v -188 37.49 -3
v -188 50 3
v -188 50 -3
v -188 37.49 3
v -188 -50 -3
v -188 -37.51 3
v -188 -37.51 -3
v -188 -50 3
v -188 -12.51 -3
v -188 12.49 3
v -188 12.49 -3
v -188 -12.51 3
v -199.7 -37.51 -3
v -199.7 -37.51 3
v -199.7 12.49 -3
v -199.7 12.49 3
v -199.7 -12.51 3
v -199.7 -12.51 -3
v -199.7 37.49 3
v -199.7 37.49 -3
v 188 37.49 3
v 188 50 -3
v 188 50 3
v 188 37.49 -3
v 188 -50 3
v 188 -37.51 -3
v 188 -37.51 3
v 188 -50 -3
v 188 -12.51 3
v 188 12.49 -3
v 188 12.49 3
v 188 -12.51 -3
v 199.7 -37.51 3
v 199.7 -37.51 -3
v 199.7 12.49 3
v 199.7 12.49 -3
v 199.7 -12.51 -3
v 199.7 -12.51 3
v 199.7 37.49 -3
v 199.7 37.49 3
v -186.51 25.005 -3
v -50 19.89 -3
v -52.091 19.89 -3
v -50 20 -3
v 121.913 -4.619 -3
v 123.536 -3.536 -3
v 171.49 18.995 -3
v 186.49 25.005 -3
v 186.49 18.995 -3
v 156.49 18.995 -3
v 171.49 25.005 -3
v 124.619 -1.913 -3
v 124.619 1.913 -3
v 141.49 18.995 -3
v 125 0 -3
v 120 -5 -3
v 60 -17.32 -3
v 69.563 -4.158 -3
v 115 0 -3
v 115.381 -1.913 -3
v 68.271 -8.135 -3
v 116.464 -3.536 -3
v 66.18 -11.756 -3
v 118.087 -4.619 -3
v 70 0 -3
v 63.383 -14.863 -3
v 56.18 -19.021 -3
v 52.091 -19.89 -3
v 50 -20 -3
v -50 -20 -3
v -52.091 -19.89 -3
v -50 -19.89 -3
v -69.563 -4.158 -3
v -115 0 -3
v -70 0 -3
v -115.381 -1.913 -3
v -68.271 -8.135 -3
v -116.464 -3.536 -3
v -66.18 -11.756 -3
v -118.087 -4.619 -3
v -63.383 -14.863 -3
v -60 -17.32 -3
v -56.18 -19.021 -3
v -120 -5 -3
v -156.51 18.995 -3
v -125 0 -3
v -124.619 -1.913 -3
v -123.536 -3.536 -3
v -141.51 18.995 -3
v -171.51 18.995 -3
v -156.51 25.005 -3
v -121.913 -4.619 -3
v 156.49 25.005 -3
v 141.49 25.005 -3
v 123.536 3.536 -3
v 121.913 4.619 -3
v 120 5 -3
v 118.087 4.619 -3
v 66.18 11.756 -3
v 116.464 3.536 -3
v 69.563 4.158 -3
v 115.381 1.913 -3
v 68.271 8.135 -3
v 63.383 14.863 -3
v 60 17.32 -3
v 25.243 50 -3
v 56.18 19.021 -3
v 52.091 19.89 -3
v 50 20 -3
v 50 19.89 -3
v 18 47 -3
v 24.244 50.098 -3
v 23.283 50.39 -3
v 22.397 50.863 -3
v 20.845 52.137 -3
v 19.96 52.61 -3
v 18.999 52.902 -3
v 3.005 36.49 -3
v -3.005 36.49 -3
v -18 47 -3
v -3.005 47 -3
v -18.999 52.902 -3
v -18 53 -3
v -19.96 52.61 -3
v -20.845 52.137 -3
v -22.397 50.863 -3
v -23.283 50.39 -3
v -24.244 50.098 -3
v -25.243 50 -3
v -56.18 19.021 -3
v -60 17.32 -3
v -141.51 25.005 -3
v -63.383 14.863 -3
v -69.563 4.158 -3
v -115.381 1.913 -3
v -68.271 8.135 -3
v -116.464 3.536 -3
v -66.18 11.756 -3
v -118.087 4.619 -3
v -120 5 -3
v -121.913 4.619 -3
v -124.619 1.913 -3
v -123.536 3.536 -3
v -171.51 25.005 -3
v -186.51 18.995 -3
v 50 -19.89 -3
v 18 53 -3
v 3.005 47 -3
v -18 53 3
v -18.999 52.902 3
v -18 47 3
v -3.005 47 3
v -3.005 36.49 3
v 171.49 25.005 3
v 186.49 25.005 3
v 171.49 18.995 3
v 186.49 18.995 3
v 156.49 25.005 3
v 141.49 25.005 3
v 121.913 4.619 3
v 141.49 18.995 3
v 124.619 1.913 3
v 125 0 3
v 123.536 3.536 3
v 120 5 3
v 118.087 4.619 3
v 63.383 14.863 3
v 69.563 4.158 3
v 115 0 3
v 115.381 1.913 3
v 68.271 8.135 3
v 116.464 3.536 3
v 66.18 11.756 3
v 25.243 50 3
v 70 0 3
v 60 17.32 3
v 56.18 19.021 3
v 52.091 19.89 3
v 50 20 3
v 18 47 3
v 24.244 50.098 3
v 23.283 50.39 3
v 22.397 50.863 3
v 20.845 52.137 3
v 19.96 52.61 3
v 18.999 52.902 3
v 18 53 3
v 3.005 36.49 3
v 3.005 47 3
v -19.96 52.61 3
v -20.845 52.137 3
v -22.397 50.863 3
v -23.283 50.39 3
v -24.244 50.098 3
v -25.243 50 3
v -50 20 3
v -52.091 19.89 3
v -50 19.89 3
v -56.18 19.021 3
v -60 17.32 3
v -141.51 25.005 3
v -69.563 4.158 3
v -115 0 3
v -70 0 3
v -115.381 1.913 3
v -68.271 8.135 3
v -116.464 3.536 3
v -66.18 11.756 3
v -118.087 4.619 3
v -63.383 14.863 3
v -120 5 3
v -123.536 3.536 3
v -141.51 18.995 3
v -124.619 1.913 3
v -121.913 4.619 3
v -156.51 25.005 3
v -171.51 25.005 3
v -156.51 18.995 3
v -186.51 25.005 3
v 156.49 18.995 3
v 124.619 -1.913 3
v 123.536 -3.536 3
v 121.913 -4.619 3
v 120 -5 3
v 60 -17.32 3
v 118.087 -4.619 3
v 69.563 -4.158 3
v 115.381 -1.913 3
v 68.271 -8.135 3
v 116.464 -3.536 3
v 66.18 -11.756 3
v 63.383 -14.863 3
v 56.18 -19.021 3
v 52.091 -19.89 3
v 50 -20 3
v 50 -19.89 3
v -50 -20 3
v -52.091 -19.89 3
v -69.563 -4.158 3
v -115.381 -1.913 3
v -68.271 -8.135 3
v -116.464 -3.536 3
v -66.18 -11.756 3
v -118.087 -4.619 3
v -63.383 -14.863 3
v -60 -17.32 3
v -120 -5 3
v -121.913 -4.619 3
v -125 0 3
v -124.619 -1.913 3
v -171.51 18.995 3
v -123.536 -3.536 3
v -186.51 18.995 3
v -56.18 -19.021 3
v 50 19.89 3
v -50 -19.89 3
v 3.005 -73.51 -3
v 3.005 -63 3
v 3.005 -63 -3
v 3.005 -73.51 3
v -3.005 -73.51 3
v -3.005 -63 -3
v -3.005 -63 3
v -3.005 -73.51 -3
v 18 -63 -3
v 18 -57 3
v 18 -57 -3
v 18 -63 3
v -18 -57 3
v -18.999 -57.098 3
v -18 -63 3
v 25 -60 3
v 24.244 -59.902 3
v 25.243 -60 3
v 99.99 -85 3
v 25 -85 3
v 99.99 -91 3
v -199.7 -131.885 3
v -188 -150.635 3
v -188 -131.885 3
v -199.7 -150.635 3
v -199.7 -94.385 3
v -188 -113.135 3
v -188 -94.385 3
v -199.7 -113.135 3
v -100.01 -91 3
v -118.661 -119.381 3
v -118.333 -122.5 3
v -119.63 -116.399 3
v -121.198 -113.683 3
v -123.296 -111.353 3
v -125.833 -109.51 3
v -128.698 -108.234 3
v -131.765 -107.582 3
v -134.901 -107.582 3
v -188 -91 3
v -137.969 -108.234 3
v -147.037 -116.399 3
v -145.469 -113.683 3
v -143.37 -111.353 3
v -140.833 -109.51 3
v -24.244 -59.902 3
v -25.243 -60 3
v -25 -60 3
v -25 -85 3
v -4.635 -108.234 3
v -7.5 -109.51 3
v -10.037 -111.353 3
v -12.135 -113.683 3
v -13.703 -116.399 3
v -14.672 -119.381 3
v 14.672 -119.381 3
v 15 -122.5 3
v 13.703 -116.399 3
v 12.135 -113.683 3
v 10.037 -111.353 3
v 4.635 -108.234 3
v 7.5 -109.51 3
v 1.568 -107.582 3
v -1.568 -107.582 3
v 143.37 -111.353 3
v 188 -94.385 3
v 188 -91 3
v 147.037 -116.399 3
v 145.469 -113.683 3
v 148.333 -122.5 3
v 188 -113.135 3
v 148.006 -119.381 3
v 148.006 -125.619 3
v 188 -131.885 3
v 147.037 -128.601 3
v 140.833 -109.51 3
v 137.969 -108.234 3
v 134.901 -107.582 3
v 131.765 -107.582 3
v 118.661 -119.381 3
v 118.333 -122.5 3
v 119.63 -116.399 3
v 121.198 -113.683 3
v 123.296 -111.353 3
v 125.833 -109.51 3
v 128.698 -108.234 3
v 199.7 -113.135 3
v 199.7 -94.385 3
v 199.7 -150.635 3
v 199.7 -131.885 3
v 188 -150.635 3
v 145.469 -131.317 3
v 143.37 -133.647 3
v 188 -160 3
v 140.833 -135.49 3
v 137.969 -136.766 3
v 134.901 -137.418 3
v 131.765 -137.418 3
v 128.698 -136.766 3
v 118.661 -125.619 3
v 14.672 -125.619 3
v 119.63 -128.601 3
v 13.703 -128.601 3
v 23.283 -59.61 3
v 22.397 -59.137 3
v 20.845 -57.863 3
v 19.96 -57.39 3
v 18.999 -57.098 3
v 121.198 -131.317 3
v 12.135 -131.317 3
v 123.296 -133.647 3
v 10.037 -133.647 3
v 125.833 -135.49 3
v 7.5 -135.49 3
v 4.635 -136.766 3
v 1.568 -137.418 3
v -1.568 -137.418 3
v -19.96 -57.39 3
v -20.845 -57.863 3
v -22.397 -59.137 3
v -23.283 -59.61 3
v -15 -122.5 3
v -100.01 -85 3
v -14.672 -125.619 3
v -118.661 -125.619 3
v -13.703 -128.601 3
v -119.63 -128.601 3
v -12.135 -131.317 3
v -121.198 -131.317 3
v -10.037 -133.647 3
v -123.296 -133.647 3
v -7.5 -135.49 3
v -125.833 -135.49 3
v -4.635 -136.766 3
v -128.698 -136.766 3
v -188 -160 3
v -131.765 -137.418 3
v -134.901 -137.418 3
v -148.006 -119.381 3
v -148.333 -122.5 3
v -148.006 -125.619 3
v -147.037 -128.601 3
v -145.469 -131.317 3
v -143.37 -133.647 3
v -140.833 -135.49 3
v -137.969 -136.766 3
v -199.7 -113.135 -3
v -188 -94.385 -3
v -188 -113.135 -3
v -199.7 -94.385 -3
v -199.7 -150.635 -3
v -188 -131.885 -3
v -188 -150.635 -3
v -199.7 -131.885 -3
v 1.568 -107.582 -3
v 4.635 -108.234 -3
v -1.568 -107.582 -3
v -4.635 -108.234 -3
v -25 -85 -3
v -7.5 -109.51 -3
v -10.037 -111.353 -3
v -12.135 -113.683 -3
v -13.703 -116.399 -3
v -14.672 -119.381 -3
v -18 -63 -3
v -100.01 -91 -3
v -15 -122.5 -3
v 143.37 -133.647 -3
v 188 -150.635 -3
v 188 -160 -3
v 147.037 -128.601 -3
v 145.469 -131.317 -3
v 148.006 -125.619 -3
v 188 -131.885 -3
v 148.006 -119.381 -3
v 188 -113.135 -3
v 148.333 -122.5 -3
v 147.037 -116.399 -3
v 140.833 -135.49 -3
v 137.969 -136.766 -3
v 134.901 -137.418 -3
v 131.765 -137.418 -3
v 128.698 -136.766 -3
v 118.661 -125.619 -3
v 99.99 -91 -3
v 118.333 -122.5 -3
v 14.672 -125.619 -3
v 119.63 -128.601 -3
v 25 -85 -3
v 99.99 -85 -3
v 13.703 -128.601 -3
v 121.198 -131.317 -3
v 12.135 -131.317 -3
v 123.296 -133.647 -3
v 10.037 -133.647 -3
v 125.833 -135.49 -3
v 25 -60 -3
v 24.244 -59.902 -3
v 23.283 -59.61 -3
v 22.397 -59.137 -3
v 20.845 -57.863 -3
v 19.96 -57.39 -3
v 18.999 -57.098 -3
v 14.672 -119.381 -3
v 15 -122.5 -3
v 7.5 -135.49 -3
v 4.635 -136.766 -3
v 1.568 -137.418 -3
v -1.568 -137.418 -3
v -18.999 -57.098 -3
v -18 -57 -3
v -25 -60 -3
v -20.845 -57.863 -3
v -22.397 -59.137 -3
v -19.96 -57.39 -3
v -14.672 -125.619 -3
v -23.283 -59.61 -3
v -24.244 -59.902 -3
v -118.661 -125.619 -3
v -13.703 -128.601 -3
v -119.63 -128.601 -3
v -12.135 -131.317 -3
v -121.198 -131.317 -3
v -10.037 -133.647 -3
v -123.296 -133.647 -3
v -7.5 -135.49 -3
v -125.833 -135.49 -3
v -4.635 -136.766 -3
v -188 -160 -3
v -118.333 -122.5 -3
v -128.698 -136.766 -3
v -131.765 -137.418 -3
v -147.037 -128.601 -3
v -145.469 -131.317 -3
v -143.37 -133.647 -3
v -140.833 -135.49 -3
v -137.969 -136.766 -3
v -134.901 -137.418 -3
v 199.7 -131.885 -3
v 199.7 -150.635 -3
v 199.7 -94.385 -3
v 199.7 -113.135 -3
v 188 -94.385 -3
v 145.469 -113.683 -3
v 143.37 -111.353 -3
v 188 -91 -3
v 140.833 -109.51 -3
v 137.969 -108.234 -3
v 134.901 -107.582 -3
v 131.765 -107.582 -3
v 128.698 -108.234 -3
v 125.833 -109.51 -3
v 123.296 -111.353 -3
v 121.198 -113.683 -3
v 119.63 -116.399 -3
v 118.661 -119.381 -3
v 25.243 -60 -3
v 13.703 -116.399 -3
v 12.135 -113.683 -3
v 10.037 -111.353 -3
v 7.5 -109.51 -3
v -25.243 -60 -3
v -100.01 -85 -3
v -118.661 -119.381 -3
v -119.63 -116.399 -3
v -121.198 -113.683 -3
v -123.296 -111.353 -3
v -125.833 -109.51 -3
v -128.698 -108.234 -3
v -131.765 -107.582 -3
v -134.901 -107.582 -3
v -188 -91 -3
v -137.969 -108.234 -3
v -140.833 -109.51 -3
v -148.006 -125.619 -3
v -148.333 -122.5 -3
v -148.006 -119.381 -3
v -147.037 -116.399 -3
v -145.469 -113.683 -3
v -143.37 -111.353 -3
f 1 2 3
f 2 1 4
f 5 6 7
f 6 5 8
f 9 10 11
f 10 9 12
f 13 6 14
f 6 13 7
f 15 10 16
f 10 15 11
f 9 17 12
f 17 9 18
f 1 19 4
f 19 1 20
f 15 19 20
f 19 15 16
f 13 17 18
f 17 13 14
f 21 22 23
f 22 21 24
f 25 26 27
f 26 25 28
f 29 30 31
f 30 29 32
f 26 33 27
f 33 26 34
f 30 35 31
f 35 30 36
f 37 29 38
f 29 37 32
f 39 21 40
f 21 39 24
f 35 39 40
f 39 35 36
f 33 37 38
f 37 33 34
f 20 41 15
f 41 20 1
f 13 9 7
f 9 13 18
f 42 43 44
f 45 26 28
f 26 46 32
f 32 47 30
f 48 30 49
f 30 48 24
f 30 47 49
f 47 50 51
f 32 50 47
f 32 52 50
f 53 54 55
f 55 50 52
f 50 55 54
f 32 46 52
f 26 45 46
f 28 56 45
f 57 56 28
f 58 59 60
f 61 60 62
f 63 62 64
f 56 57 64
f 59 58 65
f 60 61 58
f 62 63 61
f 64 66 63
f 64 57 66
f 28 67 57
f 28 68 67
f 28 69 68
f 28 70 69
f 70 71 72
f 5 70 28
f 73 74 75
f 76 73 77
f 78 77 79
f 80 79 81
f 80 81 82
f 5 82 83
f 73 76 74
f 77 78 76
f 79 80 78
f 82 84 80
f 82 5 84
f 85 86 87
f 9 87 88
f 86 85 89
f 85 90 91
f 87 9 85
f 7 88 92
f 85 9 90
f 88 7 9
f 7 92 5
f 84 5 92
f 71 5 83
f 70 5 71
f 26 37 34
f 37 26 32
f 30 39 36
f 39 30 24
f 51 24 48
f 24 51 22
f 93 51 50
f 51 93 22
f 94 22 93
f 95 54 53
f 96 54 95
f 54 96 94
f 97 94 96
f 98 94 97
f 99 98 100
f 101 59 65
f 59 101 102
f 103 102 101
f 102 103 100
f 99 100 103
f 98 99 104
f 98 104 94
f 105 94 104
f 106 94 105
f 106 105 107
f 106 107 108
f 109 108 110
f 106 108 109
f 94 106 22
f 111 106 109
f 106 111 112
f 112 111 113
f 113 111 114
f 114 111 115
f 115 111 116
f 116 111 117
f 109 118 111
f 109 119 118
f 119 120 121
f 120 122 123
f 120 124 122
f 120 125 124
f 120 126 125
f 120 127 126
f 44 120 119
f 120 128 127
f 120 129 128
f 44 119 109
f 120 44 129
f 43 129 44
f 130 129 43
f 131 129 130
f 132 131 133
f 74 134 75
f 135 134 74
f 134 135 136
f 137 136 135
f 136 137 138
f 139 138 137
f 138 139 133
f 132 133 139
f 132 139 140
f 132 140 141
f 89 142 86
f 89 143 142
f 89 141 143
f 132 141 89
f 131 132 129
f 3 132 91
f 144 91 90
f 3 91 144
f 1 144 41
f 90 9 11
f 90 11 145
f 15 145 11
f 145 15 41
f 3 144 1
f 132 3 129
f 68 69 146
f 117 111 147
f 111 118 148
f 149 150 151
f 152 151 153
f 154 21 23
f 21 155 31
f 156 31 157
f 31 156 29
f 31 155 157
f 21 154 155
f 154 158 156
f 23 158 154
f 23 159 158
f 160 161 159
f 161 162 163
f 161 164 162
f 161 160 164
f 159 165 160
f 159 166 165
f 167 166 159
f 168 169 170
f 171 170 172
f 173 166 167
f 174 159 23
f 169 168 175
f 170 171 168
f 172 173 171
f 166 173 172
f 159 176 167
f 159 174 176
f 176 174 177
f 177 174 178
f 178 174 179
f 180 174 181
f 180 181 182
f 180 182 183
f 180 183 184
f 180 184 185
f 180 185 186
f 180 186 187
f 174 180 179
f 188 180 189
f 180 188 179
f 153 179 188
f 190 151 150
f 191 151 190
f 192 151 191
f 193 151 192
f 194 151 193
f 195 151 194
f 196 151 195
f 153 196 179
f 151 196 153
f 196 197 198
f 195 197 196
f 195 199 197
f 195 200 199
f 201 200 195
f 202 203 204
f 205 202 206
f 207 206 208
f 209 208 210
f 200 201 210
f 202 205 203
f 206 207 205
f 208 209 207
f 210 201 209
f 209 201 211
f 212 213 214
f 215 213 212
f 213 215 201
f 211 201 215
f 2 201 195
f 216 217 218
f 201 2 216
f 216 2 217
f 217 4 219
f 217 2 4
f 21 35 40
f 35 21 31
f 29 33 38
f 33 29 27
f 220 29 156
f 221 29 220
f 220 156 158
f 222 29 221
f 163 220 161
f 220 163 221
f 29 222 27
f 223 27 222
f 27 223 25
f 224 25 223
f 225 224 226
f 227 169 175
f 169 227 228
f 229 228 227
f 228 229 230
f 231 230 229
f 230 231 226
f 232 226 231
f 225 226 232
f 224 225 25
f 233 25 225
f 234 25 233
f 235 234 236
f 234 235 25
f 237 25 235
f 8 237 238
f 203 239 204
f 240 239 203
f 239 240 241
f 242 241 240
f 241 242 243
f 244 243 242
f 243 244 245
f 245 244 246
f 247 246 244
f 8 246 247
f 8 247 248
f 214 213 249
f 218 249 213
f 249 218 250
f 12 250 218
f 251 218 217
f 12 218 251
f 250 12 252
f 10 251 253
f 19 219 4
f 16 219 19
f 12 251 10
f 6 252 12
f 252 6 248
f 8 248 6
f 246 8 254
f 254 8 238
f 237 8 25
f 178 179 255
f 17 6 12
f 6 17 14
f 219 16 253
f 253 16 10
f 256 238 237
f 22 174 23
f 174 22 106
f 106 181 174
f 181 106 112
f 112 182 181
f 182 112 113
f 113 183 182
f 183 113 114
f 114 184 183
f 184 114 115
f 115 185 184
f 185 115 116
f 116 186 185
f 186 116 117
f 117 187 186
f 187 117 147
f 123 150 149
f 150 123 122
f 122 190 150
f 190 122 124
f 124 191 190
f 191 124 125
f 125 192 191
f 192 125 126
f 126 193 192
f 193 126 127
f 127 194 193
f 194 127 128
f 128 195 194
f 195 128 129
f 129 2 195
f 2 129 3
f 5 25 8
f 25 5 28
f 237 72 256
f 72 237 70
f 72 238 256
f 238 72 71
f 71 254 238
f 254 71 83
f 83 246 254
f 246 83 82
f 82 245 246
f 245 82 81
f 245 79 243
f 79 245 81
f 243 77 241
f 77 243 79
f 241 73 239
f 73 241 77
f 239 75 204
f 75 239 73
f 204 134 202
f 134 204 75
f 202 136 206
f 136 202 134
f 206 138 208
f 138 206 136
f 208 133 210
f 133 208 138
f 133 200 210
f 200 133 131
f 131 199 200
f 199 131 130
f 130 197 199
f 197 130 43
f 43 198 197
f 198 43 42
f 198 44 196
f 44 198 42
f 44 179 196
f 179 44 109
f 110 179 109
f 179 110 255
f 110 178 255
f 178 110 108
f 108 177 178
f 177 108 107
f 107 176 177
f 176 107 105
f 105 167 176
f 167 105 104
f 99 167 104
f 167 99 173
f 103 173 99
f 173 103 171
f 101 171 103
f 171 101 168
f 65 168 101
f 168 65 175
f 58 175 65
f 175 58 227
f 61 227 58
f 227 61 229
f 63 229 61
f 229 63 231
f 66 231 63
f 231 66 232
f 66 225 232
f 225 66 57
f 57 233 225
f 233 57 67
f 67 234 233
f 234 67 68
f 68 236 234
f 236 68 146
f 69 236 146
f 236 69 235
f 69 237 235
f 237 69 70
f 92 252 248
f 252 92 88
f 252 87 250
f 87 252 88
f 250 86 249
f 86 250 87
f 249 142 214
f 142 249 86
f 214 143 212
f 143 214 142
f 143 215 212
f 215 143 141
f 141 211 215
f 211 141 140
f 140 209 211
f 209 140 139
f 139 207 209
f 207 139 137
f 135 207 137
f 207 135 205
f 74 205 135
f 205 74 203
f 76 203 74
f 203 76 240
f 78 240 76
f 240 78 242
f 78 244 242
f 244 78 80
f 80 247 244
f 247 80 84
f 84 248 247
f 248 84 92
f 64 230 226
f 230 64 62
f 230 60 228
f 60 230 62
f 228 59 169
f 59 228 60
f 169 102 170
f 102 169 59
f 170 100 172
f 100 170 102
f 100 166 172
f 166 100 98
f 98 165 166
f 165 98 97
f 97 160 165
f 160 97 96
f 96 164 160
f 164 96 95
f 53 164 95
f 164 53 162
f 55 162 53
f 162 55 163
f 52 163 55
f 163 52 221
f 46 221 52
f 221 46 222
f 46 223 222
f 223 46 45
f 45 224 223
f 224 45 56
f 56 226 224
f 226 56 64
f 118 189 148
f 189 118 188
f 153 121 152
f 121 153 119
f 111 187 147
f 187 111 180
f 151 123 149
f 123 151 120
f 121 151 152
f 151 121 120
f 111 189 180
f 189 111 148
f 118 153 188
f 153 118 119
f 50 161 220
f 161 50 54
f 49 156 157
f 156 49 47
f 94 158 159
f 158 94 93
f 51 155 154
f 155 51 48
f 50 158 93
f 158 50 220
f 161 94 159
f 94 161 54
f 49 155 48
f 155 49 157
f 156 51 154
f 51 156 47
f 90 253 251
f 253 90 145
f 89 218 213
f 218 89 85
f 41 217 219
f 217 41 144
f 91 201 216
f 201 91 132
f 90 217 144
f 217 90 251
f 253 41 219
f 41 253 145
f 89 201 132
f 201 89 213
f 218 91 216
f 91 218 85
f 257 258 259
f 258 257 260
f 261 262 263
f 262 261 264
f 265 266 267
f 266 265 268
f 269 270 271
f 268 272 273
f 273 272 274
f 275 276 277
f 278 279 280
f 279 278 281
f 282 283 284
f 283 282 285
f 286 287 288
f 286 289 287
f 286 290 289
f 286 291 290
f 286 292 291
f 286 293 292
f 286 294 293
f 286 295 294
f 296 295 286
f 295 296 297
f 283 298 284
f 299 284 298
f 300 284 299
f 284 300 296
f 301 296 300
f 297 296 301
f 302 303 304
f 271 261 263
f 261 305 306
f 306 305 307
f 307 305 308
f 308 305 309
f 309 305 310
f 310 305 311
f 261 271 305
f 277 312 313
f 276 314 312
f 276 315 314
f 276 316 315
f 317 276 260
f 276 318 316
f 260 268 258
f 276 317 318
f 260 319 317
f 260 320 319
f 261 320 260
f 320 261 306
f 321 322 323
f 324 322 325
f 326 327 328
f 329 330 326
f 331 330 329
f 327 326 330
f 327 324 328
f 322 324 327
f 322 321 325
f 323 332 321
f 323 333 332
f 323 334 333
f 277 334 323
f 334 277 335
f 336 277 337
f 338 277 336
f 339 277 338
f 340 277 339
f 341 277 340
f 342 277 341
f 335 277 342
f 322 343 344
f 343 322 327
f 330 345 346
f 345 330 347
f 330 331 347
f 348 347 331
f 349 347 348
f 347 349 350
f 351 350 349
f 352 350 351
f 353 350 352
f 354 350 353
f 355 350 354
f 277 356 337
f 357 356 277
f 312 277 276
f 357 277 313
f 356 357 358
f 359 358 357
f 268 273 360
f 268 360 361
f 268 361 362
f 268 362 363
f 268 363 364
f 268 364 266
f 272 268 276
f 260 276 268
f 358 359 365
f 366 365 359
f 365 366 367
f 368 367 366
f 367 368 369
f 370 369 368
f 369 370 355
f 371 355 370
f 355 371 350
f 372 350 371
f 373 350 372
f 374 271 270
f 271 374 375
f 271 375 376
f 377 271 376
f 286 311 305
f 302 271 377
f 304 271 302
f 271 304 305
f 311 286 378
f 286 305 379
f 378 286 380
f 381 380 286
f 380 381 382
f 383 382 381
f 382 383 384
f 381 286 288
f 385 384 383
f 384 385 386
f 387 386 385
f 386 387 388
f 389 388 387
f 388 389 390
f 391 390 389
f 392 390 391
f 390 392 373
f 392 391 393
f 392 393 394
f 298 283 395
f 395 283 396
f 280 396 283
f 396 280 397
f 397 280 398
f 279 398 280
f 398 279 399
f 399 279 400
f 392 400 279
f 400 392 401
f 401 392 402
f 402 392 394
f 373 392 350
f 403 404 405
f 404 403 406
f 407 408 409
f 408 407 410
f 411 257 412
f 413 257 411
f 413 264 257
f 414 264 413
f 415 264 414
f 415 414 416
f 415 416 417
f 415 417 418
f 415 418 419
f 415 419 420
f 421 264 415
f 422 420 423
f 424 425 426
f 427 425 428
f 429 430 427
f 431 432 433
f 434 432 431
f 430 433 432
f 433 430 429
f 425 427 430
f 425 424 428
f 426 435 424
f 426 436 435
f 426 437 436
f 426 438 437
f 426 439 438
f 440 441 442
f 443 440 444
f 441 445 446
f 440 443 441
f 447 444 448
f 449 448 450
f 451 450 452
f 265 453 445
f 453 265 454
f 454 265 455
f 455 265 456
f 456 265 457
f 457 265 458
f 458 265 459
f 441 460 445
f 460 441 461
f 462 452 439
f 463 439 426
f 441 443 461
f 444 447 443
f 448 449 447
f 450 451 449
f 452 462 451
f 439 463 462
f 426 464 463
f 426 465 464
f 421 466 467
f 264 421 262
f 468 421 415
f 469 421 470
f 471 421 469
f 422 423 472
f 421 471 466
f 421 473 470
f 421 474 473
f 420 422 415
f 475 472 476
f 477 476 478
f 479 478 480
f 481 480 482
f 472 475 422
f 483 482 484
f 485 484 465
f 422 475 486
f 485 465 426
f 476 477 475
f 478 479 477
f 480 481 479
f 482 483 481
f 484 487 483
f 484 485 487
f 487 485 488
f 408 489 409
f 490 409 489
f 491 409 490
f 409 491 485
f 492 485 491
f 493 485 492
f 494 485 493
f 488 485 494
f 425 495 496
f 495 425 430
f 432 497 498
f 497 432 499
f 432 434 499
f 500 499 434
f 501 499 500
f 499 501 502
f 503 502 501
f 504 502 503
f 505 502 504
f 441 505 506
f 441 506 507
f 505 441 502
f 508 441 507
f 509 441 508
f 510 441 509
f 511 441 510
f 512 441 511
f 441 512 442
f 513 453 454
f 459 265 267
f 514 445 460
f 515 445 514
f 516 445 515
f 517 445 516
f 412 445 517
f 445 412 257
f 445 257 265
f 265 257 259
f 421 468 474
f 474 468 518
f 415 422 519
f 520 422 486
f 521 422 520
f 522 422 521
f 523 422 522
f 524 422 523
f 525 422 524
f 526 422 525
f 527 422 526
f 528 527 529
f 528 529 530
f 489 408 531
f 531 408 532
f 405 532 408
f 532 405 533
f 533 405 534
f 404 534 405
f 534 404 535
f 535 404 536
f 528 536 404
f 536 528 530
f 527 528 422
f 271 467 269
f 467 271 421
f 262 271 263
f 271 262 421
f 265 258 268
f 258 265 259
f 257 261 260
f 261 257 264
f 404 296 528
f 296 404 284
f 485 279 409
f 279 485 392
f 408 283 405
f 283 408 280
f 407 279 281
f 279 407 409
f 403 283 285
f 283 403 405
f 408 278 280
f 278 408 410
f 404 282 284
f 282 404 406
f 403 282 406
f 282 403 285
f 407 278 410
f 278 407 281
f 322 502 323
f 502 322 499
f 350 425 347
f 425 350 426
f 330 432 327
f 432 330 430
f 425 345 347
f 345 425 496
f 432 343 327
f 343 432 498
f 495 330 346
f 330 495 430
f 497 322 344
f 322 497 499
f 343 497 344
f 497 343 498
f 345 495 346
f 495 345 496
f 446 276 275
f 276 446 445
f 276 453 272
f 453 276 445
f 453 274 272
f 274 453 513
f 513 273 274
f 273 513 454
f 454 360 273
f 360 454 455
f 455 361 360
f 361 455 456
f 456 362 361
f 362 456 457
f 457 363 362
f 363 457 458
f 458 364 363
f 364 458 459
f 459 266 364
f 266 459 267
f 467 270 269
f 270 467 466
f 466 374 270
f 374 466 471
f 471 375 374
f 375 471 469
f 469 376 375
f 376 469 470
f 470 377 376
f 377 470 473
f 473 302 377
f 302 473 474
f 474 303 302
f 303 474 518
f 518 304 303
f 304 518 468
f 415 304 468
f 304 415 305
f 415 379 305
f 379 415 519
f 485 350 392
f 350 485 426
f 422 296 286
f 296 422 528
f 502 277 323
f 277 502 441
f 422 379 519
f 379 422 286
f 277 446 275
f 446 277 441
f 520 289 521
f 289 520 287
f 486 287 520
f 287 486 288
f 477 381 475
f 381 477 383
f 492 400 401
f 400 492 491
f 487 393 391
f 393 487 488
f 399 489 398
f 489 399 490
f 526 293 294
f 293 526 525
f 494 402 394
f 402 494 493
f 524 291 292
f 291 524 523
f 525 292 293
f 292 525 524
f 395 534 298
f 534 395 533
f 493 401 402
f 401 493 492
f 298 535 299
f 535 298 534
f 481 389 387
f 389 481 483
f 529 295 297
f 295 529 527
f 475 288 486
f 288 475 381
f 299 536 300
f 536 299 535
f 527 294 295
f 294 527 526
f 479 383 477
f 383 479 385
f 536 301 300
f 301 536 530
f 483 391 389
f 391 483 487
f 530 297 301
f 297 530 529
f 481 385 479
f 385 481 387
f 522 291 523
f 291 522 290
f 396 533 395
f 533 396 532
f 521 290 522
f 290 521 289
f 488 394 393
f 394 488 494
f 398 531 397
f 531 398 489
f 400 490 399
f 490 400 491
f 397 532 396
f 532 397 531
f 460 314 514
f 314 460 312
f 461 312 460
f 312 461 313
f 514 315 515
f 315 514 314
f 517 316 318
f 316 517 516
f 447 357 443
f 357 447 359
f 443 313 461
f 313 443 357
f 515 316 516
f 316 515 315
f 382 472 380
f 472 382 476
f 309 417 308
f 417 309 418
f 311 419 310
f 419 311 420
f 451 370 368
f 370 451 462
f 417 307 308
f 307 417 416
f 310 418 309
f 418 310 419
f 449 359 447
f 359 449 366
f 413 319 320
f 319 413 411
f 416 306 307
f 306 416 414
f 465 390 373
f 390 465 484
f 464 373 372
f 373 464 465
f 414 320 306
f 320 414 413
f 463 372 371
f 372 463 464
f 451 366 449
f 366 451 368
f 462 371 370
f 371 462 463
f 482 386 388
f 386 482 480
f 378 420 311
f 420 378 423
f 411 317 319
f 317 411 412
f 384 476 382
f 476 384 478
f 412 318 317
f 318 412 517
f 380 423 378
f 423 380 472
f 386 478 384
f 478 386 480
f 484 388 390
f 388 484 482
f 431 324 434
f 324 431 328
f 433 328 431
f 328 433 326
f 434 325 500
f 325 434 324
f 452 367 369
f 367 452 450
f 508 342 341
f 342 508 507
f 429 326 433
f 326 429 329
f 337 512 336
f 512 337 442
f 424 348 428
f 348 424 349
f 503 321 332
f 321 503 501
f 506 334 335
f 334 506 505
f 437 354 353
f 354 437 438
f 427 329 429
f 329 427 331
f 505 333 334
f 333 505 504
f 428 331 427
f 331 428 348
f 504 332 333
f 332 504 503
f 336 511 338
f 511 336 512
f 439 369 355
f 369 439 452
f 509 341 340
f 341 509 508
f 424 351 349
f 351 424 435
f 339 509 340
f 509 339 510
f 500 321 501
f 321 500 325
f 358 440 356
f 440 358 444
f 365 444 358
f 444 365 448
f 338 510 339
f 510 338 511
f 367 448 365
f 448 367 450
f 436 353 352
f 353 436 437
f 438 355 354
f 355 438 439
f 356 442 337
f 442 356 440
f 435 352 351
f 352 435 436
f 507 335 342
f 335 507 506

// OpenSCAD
// file: profiles/n-re.scad
module track_rolloff(h,tw)
{
    th = 3;
    x = th/2/(sqrt(2)-1);
    cr = sqrt(2)*th/2/(sqrt(2)-1);
    translate([0,h/2,0])
    {
        translate([0,th/2,0]) square([tw,th],true);
        translate([tw/2,0,0])
        {
            translate([0,th/2-x,0]) circle(cr, $fn=32);
            difference()
            {
                square([2*x,th/2],false);
                translate([2*x,th/2+x,0]) circle(cr, $fn=32);
            }
        }
    }
}

module frame_profile_base(w,h,tw)
{
    translate([w/2,h/2,0])
    difference()
    {
        union()
        {
            square([w,h],true);
            track_rolloff(h,tw);
            mirror([-1,0,0]) track_rolloff(h,tw);
        }
        translate([-120,0,0]) circle(5);
        translate([120,0,0]) circle(5);
        square([100,40],true);
        translate([-50,0,0]) circle(20);
        translate([50,0,0]) circle(20);
    }
}

module frame_profile_intermediate(w,h,sH,tw)
{
    rollW = 7;
    depth = h-sH;
    translate([w/2,h/2,0])
    difference()
    {
        union()
        {
            square([w,h],true);
            track_rolloff(h,tw);
            mirror([-1,0,0]) track_rolloff(h,tw);
        }
        translate([-w/2,h/2-depth,0])
        square([(w-tw-rollW*2)/2,depth],false);
        translate([tw/2+rollW,h/2-depth,0])
        square([(w-tw-rollW*2)/2,depth],false);
    }
}


module frame_nre_f1(w, h, sH, tw)
{
    difference()
    {
        frame(w, h, otherT=thick*2)
        translate([-w/2,-h/2,-thick/2])
        linear_extrude(thick)
        frame_profile_base(w,h,tw);
        
        track_single(h, tw, thick);

        // finger for track t support
        translate([-thick/2,h/2-trackTh/2+thick/2,0])
        fingerH(trackTh, 1, otherT=thick, inv=true);
        
        for(i=[-1:2:1])
        translate([i*(-w/2+thick+edgeSup/2),edgeSupOffs,-thick/2])
        rotate([90,0,0])
        fingerV(edgeSup, 4, otherT=thick, inv=true);

    }
}

module frame_nre_f1_intermediate_B(w, h, sH, tw, otherT=thick*2)
{
    difference()
    {
        translate([0,-(h-sH)/2,0])
        frame(w,sH, otherT=otherT)
        translate([-w/2,-sH/2,-thick/2])
        linear_extrude(thick)
        //import("profiles/n-re-f1-intermediate.svg");
        frame_profile_intermediate(w,h,sH,tw);
        
        track_single(h, trackW, thick);
        
        // finger for track t support
        translate([-thick/2,h/2-trackTh/2+thick/2,0])
        fingerH(33, 1, otherT=thick, inv=true);

        yoffs(-h/2+sH-thick)
        fingerV(w, 2);
       
        for(i=[-1:1:1])
        translate([i*w/3,-(h-sH)/2,-thick/2-eps])
        cylinder(thick+2*eps, r=15);
    }
}
// file: profiles/base.scad
eps = .01;
thick = 6;
lasRad = .0;
lasWid = 2*lasRad;
cutWid = 0.3; // retract finger depth to avoid poking out
trackTh = 33;
edgeSup = 60;

module xoffs(offs) { translate([offs,0,0]) children(); }
module yoffs(offs) { translate([0,offs,0]) children(); }
module ccube(p) // p=[width,depth,height] (centered)
{
    translate([-p[0]/2,-p[1]/2,-p[2]/2])
    cube(p);
}

module fingerH(H, N, selfT=thick, otherT=thick, inv=false)
{
    h = H/N;
    off = inv ? 1 : 0;
    intersection()
    {
        translate([0,-H/2-eps,0])
        union()
        {
            for(i=[off:2:N])
            {
                translate([otherT/2-lasWid,i*h,0])
                ccube([otherT+off*eps,h-lasWid,selfT+eps]);
            }
        }
        translate([otherT/2,0,0])
        ccube([otherT+off*eps,H+eps,selfT+eps]);
    }
}

module fingerHcut(H, selfT=thick, otherT=thick)
{
    ccube([cutWid*2, H+eps, selfT+eps]);
}

module fingerV(W, N, selfT=thick, otherT=thick, inv=false)
{
    // TODO: implement without rotate (many side-effects)
    translate([0, otherT, 0])
    rotate([0,0,-90])
    fingerH(W,N,selfT,otherT,inv);
}

module fingerVcut(W, selfT=thick, otherT=thick)
{
    //translate([0,otherT,0])
    ccube([W+eps, cutWid*2, selfT+eps]);
}

module track_single(height, width, length)
{
    translate([0, height/2+3-thick/2, -length/2+thick/2])
    difference()
    {
        ccube([width, thick, length]);

        translate([-thick/2,0,0])
        rotate([-90,0,0])
        fingerH(length, 30, inv=true);
    }
}

module track_t(height, length)
{
    //translate([0, height/2+3-thick/2, -length/2+thick/2])
    //rotate([0,0,90])
    difference()
    {
        ccube([length, trackTh, thick]);
        
        translate([-thick,0,0])
        fingerH(trackTh, 1, otherT=thick*2);
        translate([-length/2-thick,0,0])
        fingerH(trackTh, 1, otherT=thick*3);
        translate([length/2-thick*2,0,0])
        fingerH(trackTh, 1, otherT=thick*3);
        
        yoffs(+trackTh/2-thick+2*eps) // TODO: rotate requires -thick
        fingerV(length, 30);
        yoffs(+trackTh/2+2*eps) // TODO: remove when rotate removed
        fingerVcut(length);
    }
}

module frame(width, height, inv=false, N=4, otherT=thick)
{
    difference()
    {
        union()
        children();
        
        xoffs(-width/2)
        {
            fingerH(height, N, otherT=otherT, inv=inv);
            fingerHcut(height);
        }

        rotate([0,180,0])
        xoffs(-width/2)
        {
            fingerH(height, N, otherT=otherT, inv=inv);
            fingerHcut(height);
        }
    }
}


module frame_side(width, height, sH, inv=false)
{
    difference()
    {
        frame(width, height, inv, otherT=thick*2)
        ccube([width,height,thick]);
        
        translate([0,-(height-sH)/2,thick/2])
        rotate([0,90,0])
        fingerH(sH, 4, selfT=thick*2, otherT=thick*2, inv=true);
        
        for(i=[-1:2:1])
        translate([i*(-width/2+edgeSup/2+thick),edgeSupOffs,-thick/2])
        rotate([90,0,0])
        fingerV(edgeSup, 4, otherT=thick, inv=true);
    }
}

module frame_support(width, height, sH)
{
    translate([0,-(height-sH)/2,0])
    difference()
    {
        frame(width, sH, inv=false, otherT=thick*2)
        ccube([width,sH,thick]);
        
        for(i=[-1:2:1])
        translate([i*width/4,0,-thick/2-eps])
        cylinder(thick+2*eps, r=15);
        
        translate([thick/2,0,thick/2+eps])
        rotate([0,90,0])
        fingerH(sH, 1, otherT=thick*2, inv=false);
    }
}

module edge_support()
{
    l = edgeSup;
    difference()
    {
        translate([-l/2,-l/2,-thick/2])
        linear_extrude(thick)
        polygon([[0,0],[l,0],[l,10],[10,l],[0,l]]);
        
        xoffs(-l/2) yoffs(thick)
        {
            fingerH(l, 4, otherT=2*thick, inv=false);
            fingerHcut(l);
        }
        
        yoffs(-l/2) xoffs(thick)
        {
            fingerV(l, 4, otherT=2*thick, inv=false);
            fingerVcut(l, otherT=2*thick);
        }
    }
}
// main file
include <profiles/base.scad>
include <profiles/n-re.scad>

boxW = 400;
boxL = 400;
boxH = 100;
trackW = 36;
supportH = 75;
hdiff = boxH-supportH;
edgeSupOffs = -boxH/2+supportH-thick/2;

render()
frame_nre_f1(boxW, boxH, supportH, trackW);
//stranslate([-boxW/2,-boxH/2,-6]) import("profiles/n-re-f1.svg");
//frame_profile_base(boxW,boxH, trackW);

translate([0,-boxH*1.1, 0])
render()
frame_nre_f1_intermediate_B(boxW, boxH, supportH, trackW);
